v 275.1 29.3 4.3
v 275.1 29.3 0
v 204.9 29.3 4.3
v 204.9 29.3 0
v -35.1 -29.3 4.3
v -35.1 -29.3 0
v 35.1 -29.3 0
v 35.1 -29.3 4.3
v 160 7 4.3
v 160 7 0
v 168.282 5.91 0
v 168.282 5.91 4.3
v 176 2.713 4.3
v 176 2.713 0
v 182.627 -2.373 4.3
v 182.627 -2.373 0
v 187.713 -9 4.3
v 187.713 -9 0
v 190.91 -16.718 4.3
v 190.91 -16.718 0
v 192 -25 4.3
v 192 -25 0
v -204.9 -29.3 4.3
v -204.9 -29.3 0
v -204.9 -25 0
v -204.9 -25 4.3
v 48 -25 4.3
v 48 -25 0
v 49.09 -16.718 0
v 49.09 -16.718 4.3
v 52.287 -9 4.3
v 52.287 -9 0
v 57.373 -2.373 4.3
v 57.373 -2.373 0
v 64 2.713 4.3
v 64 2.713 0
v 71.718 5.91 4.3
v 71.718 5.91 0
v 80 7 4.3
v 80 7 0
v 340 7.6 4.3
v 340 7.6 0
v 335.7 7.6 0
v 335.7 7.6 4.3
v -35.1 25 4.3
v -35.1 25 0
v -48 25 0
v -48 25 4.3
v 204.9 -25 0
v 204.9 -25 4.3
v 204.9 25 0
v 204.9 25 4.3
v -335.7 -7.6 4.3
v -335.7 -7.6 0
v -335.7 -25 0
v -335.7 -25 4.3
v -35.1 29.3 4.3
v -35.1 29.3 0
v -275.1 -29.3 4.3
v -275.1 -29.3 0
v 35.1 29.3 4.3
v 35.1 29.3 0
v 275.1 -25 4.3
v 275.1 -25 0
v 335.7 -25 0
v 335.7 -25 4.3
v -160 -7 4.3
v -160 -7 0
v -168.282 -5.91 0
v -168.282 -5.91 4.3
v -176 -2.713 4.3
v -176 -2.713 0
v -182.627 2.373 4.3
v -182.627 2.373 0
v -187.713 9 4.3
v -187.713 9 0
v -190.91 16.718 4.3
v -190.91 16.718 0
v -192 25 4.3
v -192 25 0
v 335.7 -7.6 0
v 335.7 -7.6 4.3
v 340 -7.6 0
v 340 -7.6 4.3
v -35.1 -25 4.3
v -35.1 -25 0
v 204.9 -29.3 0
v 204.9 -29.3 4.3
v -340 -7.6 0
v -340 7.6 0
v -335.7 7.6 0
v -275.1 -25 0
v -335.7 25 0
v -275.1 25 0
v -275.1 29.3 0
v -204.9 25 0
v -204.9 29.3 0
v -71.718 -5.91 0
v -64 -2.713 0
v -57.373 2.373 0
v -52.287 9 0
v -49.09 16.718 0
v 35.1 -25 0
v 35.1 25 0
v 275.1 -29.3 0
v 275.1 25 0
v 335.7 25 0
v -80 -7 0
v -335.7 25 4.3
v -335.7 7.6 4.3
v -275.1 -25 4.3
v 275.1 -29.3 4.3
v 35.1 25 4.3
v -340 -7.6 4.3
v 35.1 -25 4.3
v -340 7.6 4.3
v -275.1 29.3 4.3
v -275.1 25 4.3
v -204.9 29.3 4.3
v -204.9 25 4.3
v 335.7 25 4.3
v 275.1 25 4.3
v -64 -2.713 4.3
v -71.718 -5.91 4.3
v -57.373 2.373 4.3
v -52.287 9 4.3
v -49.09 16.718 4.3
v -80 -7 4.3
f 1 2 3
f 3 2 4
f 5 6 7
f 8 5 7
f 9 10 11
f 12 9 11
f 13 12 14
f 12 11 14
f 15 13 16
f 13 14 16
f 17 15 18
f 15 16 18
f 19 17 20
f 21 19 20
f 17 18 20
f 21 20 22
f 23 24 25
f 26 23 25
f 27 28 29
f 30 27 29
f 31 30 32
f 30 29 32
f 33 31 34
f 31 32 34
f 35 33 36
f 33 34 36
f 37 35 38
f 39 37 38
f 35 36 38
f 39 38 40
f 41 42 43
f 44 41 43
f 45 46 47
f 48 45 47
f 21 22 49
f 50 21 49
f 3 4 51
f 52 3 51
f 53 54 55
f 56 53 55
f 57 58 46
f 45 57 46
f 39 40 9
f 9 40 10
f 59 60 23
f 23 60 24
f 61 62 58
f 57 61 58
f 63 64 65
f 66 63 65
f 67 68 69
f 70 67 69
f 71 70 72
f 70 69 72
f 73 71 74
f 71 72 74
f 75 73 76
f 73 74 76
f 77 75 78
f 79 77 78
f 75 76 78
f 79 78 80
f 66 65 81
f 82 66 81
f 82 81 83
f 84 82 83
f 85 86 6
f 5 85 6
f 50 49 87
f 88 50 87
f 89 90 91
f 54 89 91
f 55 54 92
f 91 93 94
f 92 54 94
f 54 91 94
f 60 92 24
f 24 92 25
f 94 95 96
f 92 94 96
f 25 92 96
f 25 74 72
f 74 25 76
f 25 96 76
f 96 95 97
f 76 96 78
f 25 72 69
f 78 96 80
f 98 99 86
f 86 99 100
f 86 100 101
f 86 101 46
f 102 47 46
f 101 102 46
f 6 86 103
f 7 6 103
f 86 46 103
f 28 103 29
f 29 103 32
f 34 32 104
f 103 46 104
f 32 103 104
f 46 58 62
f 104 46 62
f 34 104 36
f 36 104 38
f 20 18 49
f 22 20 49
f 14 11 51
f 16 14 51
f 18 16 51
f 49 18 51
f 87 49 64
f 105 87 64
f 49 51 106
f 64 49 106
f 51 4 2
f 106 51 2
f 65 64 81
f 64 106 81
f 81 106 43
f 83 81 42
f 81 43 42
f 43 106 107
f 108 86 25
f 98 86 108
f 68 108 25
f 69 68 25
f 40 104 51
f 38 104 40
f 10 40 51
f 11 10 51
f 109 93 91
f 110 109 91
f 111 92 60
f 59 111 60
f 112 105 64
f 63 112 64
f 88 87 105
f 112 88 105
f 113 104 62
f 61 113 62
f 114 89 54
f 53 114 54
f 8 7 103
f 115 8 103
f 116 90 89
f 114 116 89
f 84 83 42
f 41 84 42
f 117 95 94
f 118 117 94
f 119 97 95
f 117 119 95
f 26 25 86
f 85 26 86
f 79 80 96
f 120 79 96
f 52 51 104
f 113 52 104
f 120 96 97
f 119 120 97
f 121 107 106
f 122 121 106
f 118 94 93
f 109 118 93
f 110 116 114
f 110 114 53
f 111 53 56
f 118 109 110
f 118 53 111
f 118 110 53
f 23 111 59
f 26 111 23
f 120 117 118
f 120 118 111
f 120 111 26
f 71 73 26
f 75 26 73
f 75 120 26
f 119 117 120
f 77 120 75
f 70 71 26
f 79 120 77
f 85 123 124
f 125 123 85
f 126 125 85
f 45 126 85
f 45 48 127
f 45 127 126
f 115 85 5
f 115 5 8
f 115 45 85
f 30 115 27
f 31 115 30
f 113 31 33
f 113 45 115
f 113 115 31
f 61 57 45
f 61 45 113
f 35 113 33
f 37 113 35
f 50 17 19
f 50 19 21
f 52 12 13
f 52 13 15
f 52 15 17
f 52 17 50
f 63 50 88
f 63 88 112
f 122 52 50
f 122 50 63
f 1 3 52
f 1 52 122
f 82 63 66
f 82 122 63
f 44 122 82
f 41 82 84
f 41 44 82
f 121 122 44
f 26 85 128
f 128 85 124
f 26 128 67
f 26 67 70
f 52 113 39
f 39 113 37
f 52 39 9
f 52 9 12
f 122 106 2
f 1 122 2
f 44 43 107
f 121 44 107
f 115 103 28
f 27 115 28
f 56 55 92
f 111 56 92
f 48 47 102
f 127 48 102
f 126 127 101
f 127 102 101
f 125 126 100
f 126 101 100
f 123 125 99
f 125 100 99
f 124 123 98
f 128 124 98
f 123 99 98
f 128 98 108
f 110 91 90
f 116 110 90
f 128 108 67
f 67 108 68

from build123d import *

# Parameters (mm, degrees)
BOSS_EXTRUDE1_DEPTH = 4.3


with BuildPart() as part:
    # Sketch1 → Boss-Extrude1 (new body)
    with BuildSketch(Plane.XY):
        with BuildLine():
            Line((-335.7, -25), (-275.1, -25))
            Line((-275.1, -25), (-275.1, -29.3))
            Line((-275.1, -29.3), (-204.9, -29.3))
            Line((-204.9, -29.3), (-204.9, -25))
            Line((-204.9, -25), (-35.1, -25))
            Line((-35.1, -25), (-35.1, -29.3))
            Line((-35.1, -29.3), (35.1, -29.3))
            Line((35.1, -29.3), (35.1, -25))
            Line((35.1, -25), (48, -25))
            ThreePointArc((48, -25), (57.372583002, -2.372583002), (80, 7))
            Line((80, 7), (160, 7))
            ThreePointArc((160, 7), (182.627416998, -2.372583002), (192, -25))
            Line((192, -25), (204.9, -25))
            Line((204.9, -25), (204.9, -29.3))
            Line((204.9, -29.3), (275.1, -29.3))
            Line((275.1, -29.3), (275.1, -25))
            Line((275.1, -25), (335.7, -25))
            Line((335.7, -25), (335.7, -7.6))
            Line((335.7, -7.6), (340, -7.6))
            Line((340, -7.6), (340, 7.6))
            Line((340, 7.6), (335.7, 7.6))
            Line((335.7, 7.6), (335.7, 25))
            Line((335.7, 25), (275.1, 25))
            Line((275.1, 25), (275.1, 29.3))
            Line((275.1, 29.3), (204.9, 29.3))
            Line((204.9, 29.3), (204.9, 25))
            Line((204.9, 25), (35.1, 25))
            Line((35.1, 25), (35.1, 29.3))
            Line((35.1, 29.3), (-35.1, 29.3))
            Line((-35.1, 29.3), (-35.1, 25))
            Line((-35.1, 25), (-48, 25))
            ThreePointArc((-48, 25), (-57.372583002, 2.372583002), (-80, -7))
            Line((-80, -7), (-160, -7))
            ThreePointArc((-160, -7), (-182.627416998, 2.372583002), (-192, 25))
            Line((-192, 25), (-204.9, 25))
            Line((-204.9, 25), (-204.9, 29.3))
            Line((-204.9, 29.3), (-275.1, 29.3))
            Line((-275.1, 29.3), (-275.1, 25))
            Line((-275.1, 25), (-335.7, 25))
            Line((-335.7, 25), (-335.7, 7.6))
            Line((-335.7, 7.6), (-340, 7.6))
            Line((-340, 7.6), (-340, -7.6))
            Line((-340, -7.6), (-335.7, -7.6))
            Line((-335.7, -7.6), (-335.7, -25))
        make_face()
    extrude(amount=BOSS_EXTRUDE1_DEPTH)


solid = part.part
